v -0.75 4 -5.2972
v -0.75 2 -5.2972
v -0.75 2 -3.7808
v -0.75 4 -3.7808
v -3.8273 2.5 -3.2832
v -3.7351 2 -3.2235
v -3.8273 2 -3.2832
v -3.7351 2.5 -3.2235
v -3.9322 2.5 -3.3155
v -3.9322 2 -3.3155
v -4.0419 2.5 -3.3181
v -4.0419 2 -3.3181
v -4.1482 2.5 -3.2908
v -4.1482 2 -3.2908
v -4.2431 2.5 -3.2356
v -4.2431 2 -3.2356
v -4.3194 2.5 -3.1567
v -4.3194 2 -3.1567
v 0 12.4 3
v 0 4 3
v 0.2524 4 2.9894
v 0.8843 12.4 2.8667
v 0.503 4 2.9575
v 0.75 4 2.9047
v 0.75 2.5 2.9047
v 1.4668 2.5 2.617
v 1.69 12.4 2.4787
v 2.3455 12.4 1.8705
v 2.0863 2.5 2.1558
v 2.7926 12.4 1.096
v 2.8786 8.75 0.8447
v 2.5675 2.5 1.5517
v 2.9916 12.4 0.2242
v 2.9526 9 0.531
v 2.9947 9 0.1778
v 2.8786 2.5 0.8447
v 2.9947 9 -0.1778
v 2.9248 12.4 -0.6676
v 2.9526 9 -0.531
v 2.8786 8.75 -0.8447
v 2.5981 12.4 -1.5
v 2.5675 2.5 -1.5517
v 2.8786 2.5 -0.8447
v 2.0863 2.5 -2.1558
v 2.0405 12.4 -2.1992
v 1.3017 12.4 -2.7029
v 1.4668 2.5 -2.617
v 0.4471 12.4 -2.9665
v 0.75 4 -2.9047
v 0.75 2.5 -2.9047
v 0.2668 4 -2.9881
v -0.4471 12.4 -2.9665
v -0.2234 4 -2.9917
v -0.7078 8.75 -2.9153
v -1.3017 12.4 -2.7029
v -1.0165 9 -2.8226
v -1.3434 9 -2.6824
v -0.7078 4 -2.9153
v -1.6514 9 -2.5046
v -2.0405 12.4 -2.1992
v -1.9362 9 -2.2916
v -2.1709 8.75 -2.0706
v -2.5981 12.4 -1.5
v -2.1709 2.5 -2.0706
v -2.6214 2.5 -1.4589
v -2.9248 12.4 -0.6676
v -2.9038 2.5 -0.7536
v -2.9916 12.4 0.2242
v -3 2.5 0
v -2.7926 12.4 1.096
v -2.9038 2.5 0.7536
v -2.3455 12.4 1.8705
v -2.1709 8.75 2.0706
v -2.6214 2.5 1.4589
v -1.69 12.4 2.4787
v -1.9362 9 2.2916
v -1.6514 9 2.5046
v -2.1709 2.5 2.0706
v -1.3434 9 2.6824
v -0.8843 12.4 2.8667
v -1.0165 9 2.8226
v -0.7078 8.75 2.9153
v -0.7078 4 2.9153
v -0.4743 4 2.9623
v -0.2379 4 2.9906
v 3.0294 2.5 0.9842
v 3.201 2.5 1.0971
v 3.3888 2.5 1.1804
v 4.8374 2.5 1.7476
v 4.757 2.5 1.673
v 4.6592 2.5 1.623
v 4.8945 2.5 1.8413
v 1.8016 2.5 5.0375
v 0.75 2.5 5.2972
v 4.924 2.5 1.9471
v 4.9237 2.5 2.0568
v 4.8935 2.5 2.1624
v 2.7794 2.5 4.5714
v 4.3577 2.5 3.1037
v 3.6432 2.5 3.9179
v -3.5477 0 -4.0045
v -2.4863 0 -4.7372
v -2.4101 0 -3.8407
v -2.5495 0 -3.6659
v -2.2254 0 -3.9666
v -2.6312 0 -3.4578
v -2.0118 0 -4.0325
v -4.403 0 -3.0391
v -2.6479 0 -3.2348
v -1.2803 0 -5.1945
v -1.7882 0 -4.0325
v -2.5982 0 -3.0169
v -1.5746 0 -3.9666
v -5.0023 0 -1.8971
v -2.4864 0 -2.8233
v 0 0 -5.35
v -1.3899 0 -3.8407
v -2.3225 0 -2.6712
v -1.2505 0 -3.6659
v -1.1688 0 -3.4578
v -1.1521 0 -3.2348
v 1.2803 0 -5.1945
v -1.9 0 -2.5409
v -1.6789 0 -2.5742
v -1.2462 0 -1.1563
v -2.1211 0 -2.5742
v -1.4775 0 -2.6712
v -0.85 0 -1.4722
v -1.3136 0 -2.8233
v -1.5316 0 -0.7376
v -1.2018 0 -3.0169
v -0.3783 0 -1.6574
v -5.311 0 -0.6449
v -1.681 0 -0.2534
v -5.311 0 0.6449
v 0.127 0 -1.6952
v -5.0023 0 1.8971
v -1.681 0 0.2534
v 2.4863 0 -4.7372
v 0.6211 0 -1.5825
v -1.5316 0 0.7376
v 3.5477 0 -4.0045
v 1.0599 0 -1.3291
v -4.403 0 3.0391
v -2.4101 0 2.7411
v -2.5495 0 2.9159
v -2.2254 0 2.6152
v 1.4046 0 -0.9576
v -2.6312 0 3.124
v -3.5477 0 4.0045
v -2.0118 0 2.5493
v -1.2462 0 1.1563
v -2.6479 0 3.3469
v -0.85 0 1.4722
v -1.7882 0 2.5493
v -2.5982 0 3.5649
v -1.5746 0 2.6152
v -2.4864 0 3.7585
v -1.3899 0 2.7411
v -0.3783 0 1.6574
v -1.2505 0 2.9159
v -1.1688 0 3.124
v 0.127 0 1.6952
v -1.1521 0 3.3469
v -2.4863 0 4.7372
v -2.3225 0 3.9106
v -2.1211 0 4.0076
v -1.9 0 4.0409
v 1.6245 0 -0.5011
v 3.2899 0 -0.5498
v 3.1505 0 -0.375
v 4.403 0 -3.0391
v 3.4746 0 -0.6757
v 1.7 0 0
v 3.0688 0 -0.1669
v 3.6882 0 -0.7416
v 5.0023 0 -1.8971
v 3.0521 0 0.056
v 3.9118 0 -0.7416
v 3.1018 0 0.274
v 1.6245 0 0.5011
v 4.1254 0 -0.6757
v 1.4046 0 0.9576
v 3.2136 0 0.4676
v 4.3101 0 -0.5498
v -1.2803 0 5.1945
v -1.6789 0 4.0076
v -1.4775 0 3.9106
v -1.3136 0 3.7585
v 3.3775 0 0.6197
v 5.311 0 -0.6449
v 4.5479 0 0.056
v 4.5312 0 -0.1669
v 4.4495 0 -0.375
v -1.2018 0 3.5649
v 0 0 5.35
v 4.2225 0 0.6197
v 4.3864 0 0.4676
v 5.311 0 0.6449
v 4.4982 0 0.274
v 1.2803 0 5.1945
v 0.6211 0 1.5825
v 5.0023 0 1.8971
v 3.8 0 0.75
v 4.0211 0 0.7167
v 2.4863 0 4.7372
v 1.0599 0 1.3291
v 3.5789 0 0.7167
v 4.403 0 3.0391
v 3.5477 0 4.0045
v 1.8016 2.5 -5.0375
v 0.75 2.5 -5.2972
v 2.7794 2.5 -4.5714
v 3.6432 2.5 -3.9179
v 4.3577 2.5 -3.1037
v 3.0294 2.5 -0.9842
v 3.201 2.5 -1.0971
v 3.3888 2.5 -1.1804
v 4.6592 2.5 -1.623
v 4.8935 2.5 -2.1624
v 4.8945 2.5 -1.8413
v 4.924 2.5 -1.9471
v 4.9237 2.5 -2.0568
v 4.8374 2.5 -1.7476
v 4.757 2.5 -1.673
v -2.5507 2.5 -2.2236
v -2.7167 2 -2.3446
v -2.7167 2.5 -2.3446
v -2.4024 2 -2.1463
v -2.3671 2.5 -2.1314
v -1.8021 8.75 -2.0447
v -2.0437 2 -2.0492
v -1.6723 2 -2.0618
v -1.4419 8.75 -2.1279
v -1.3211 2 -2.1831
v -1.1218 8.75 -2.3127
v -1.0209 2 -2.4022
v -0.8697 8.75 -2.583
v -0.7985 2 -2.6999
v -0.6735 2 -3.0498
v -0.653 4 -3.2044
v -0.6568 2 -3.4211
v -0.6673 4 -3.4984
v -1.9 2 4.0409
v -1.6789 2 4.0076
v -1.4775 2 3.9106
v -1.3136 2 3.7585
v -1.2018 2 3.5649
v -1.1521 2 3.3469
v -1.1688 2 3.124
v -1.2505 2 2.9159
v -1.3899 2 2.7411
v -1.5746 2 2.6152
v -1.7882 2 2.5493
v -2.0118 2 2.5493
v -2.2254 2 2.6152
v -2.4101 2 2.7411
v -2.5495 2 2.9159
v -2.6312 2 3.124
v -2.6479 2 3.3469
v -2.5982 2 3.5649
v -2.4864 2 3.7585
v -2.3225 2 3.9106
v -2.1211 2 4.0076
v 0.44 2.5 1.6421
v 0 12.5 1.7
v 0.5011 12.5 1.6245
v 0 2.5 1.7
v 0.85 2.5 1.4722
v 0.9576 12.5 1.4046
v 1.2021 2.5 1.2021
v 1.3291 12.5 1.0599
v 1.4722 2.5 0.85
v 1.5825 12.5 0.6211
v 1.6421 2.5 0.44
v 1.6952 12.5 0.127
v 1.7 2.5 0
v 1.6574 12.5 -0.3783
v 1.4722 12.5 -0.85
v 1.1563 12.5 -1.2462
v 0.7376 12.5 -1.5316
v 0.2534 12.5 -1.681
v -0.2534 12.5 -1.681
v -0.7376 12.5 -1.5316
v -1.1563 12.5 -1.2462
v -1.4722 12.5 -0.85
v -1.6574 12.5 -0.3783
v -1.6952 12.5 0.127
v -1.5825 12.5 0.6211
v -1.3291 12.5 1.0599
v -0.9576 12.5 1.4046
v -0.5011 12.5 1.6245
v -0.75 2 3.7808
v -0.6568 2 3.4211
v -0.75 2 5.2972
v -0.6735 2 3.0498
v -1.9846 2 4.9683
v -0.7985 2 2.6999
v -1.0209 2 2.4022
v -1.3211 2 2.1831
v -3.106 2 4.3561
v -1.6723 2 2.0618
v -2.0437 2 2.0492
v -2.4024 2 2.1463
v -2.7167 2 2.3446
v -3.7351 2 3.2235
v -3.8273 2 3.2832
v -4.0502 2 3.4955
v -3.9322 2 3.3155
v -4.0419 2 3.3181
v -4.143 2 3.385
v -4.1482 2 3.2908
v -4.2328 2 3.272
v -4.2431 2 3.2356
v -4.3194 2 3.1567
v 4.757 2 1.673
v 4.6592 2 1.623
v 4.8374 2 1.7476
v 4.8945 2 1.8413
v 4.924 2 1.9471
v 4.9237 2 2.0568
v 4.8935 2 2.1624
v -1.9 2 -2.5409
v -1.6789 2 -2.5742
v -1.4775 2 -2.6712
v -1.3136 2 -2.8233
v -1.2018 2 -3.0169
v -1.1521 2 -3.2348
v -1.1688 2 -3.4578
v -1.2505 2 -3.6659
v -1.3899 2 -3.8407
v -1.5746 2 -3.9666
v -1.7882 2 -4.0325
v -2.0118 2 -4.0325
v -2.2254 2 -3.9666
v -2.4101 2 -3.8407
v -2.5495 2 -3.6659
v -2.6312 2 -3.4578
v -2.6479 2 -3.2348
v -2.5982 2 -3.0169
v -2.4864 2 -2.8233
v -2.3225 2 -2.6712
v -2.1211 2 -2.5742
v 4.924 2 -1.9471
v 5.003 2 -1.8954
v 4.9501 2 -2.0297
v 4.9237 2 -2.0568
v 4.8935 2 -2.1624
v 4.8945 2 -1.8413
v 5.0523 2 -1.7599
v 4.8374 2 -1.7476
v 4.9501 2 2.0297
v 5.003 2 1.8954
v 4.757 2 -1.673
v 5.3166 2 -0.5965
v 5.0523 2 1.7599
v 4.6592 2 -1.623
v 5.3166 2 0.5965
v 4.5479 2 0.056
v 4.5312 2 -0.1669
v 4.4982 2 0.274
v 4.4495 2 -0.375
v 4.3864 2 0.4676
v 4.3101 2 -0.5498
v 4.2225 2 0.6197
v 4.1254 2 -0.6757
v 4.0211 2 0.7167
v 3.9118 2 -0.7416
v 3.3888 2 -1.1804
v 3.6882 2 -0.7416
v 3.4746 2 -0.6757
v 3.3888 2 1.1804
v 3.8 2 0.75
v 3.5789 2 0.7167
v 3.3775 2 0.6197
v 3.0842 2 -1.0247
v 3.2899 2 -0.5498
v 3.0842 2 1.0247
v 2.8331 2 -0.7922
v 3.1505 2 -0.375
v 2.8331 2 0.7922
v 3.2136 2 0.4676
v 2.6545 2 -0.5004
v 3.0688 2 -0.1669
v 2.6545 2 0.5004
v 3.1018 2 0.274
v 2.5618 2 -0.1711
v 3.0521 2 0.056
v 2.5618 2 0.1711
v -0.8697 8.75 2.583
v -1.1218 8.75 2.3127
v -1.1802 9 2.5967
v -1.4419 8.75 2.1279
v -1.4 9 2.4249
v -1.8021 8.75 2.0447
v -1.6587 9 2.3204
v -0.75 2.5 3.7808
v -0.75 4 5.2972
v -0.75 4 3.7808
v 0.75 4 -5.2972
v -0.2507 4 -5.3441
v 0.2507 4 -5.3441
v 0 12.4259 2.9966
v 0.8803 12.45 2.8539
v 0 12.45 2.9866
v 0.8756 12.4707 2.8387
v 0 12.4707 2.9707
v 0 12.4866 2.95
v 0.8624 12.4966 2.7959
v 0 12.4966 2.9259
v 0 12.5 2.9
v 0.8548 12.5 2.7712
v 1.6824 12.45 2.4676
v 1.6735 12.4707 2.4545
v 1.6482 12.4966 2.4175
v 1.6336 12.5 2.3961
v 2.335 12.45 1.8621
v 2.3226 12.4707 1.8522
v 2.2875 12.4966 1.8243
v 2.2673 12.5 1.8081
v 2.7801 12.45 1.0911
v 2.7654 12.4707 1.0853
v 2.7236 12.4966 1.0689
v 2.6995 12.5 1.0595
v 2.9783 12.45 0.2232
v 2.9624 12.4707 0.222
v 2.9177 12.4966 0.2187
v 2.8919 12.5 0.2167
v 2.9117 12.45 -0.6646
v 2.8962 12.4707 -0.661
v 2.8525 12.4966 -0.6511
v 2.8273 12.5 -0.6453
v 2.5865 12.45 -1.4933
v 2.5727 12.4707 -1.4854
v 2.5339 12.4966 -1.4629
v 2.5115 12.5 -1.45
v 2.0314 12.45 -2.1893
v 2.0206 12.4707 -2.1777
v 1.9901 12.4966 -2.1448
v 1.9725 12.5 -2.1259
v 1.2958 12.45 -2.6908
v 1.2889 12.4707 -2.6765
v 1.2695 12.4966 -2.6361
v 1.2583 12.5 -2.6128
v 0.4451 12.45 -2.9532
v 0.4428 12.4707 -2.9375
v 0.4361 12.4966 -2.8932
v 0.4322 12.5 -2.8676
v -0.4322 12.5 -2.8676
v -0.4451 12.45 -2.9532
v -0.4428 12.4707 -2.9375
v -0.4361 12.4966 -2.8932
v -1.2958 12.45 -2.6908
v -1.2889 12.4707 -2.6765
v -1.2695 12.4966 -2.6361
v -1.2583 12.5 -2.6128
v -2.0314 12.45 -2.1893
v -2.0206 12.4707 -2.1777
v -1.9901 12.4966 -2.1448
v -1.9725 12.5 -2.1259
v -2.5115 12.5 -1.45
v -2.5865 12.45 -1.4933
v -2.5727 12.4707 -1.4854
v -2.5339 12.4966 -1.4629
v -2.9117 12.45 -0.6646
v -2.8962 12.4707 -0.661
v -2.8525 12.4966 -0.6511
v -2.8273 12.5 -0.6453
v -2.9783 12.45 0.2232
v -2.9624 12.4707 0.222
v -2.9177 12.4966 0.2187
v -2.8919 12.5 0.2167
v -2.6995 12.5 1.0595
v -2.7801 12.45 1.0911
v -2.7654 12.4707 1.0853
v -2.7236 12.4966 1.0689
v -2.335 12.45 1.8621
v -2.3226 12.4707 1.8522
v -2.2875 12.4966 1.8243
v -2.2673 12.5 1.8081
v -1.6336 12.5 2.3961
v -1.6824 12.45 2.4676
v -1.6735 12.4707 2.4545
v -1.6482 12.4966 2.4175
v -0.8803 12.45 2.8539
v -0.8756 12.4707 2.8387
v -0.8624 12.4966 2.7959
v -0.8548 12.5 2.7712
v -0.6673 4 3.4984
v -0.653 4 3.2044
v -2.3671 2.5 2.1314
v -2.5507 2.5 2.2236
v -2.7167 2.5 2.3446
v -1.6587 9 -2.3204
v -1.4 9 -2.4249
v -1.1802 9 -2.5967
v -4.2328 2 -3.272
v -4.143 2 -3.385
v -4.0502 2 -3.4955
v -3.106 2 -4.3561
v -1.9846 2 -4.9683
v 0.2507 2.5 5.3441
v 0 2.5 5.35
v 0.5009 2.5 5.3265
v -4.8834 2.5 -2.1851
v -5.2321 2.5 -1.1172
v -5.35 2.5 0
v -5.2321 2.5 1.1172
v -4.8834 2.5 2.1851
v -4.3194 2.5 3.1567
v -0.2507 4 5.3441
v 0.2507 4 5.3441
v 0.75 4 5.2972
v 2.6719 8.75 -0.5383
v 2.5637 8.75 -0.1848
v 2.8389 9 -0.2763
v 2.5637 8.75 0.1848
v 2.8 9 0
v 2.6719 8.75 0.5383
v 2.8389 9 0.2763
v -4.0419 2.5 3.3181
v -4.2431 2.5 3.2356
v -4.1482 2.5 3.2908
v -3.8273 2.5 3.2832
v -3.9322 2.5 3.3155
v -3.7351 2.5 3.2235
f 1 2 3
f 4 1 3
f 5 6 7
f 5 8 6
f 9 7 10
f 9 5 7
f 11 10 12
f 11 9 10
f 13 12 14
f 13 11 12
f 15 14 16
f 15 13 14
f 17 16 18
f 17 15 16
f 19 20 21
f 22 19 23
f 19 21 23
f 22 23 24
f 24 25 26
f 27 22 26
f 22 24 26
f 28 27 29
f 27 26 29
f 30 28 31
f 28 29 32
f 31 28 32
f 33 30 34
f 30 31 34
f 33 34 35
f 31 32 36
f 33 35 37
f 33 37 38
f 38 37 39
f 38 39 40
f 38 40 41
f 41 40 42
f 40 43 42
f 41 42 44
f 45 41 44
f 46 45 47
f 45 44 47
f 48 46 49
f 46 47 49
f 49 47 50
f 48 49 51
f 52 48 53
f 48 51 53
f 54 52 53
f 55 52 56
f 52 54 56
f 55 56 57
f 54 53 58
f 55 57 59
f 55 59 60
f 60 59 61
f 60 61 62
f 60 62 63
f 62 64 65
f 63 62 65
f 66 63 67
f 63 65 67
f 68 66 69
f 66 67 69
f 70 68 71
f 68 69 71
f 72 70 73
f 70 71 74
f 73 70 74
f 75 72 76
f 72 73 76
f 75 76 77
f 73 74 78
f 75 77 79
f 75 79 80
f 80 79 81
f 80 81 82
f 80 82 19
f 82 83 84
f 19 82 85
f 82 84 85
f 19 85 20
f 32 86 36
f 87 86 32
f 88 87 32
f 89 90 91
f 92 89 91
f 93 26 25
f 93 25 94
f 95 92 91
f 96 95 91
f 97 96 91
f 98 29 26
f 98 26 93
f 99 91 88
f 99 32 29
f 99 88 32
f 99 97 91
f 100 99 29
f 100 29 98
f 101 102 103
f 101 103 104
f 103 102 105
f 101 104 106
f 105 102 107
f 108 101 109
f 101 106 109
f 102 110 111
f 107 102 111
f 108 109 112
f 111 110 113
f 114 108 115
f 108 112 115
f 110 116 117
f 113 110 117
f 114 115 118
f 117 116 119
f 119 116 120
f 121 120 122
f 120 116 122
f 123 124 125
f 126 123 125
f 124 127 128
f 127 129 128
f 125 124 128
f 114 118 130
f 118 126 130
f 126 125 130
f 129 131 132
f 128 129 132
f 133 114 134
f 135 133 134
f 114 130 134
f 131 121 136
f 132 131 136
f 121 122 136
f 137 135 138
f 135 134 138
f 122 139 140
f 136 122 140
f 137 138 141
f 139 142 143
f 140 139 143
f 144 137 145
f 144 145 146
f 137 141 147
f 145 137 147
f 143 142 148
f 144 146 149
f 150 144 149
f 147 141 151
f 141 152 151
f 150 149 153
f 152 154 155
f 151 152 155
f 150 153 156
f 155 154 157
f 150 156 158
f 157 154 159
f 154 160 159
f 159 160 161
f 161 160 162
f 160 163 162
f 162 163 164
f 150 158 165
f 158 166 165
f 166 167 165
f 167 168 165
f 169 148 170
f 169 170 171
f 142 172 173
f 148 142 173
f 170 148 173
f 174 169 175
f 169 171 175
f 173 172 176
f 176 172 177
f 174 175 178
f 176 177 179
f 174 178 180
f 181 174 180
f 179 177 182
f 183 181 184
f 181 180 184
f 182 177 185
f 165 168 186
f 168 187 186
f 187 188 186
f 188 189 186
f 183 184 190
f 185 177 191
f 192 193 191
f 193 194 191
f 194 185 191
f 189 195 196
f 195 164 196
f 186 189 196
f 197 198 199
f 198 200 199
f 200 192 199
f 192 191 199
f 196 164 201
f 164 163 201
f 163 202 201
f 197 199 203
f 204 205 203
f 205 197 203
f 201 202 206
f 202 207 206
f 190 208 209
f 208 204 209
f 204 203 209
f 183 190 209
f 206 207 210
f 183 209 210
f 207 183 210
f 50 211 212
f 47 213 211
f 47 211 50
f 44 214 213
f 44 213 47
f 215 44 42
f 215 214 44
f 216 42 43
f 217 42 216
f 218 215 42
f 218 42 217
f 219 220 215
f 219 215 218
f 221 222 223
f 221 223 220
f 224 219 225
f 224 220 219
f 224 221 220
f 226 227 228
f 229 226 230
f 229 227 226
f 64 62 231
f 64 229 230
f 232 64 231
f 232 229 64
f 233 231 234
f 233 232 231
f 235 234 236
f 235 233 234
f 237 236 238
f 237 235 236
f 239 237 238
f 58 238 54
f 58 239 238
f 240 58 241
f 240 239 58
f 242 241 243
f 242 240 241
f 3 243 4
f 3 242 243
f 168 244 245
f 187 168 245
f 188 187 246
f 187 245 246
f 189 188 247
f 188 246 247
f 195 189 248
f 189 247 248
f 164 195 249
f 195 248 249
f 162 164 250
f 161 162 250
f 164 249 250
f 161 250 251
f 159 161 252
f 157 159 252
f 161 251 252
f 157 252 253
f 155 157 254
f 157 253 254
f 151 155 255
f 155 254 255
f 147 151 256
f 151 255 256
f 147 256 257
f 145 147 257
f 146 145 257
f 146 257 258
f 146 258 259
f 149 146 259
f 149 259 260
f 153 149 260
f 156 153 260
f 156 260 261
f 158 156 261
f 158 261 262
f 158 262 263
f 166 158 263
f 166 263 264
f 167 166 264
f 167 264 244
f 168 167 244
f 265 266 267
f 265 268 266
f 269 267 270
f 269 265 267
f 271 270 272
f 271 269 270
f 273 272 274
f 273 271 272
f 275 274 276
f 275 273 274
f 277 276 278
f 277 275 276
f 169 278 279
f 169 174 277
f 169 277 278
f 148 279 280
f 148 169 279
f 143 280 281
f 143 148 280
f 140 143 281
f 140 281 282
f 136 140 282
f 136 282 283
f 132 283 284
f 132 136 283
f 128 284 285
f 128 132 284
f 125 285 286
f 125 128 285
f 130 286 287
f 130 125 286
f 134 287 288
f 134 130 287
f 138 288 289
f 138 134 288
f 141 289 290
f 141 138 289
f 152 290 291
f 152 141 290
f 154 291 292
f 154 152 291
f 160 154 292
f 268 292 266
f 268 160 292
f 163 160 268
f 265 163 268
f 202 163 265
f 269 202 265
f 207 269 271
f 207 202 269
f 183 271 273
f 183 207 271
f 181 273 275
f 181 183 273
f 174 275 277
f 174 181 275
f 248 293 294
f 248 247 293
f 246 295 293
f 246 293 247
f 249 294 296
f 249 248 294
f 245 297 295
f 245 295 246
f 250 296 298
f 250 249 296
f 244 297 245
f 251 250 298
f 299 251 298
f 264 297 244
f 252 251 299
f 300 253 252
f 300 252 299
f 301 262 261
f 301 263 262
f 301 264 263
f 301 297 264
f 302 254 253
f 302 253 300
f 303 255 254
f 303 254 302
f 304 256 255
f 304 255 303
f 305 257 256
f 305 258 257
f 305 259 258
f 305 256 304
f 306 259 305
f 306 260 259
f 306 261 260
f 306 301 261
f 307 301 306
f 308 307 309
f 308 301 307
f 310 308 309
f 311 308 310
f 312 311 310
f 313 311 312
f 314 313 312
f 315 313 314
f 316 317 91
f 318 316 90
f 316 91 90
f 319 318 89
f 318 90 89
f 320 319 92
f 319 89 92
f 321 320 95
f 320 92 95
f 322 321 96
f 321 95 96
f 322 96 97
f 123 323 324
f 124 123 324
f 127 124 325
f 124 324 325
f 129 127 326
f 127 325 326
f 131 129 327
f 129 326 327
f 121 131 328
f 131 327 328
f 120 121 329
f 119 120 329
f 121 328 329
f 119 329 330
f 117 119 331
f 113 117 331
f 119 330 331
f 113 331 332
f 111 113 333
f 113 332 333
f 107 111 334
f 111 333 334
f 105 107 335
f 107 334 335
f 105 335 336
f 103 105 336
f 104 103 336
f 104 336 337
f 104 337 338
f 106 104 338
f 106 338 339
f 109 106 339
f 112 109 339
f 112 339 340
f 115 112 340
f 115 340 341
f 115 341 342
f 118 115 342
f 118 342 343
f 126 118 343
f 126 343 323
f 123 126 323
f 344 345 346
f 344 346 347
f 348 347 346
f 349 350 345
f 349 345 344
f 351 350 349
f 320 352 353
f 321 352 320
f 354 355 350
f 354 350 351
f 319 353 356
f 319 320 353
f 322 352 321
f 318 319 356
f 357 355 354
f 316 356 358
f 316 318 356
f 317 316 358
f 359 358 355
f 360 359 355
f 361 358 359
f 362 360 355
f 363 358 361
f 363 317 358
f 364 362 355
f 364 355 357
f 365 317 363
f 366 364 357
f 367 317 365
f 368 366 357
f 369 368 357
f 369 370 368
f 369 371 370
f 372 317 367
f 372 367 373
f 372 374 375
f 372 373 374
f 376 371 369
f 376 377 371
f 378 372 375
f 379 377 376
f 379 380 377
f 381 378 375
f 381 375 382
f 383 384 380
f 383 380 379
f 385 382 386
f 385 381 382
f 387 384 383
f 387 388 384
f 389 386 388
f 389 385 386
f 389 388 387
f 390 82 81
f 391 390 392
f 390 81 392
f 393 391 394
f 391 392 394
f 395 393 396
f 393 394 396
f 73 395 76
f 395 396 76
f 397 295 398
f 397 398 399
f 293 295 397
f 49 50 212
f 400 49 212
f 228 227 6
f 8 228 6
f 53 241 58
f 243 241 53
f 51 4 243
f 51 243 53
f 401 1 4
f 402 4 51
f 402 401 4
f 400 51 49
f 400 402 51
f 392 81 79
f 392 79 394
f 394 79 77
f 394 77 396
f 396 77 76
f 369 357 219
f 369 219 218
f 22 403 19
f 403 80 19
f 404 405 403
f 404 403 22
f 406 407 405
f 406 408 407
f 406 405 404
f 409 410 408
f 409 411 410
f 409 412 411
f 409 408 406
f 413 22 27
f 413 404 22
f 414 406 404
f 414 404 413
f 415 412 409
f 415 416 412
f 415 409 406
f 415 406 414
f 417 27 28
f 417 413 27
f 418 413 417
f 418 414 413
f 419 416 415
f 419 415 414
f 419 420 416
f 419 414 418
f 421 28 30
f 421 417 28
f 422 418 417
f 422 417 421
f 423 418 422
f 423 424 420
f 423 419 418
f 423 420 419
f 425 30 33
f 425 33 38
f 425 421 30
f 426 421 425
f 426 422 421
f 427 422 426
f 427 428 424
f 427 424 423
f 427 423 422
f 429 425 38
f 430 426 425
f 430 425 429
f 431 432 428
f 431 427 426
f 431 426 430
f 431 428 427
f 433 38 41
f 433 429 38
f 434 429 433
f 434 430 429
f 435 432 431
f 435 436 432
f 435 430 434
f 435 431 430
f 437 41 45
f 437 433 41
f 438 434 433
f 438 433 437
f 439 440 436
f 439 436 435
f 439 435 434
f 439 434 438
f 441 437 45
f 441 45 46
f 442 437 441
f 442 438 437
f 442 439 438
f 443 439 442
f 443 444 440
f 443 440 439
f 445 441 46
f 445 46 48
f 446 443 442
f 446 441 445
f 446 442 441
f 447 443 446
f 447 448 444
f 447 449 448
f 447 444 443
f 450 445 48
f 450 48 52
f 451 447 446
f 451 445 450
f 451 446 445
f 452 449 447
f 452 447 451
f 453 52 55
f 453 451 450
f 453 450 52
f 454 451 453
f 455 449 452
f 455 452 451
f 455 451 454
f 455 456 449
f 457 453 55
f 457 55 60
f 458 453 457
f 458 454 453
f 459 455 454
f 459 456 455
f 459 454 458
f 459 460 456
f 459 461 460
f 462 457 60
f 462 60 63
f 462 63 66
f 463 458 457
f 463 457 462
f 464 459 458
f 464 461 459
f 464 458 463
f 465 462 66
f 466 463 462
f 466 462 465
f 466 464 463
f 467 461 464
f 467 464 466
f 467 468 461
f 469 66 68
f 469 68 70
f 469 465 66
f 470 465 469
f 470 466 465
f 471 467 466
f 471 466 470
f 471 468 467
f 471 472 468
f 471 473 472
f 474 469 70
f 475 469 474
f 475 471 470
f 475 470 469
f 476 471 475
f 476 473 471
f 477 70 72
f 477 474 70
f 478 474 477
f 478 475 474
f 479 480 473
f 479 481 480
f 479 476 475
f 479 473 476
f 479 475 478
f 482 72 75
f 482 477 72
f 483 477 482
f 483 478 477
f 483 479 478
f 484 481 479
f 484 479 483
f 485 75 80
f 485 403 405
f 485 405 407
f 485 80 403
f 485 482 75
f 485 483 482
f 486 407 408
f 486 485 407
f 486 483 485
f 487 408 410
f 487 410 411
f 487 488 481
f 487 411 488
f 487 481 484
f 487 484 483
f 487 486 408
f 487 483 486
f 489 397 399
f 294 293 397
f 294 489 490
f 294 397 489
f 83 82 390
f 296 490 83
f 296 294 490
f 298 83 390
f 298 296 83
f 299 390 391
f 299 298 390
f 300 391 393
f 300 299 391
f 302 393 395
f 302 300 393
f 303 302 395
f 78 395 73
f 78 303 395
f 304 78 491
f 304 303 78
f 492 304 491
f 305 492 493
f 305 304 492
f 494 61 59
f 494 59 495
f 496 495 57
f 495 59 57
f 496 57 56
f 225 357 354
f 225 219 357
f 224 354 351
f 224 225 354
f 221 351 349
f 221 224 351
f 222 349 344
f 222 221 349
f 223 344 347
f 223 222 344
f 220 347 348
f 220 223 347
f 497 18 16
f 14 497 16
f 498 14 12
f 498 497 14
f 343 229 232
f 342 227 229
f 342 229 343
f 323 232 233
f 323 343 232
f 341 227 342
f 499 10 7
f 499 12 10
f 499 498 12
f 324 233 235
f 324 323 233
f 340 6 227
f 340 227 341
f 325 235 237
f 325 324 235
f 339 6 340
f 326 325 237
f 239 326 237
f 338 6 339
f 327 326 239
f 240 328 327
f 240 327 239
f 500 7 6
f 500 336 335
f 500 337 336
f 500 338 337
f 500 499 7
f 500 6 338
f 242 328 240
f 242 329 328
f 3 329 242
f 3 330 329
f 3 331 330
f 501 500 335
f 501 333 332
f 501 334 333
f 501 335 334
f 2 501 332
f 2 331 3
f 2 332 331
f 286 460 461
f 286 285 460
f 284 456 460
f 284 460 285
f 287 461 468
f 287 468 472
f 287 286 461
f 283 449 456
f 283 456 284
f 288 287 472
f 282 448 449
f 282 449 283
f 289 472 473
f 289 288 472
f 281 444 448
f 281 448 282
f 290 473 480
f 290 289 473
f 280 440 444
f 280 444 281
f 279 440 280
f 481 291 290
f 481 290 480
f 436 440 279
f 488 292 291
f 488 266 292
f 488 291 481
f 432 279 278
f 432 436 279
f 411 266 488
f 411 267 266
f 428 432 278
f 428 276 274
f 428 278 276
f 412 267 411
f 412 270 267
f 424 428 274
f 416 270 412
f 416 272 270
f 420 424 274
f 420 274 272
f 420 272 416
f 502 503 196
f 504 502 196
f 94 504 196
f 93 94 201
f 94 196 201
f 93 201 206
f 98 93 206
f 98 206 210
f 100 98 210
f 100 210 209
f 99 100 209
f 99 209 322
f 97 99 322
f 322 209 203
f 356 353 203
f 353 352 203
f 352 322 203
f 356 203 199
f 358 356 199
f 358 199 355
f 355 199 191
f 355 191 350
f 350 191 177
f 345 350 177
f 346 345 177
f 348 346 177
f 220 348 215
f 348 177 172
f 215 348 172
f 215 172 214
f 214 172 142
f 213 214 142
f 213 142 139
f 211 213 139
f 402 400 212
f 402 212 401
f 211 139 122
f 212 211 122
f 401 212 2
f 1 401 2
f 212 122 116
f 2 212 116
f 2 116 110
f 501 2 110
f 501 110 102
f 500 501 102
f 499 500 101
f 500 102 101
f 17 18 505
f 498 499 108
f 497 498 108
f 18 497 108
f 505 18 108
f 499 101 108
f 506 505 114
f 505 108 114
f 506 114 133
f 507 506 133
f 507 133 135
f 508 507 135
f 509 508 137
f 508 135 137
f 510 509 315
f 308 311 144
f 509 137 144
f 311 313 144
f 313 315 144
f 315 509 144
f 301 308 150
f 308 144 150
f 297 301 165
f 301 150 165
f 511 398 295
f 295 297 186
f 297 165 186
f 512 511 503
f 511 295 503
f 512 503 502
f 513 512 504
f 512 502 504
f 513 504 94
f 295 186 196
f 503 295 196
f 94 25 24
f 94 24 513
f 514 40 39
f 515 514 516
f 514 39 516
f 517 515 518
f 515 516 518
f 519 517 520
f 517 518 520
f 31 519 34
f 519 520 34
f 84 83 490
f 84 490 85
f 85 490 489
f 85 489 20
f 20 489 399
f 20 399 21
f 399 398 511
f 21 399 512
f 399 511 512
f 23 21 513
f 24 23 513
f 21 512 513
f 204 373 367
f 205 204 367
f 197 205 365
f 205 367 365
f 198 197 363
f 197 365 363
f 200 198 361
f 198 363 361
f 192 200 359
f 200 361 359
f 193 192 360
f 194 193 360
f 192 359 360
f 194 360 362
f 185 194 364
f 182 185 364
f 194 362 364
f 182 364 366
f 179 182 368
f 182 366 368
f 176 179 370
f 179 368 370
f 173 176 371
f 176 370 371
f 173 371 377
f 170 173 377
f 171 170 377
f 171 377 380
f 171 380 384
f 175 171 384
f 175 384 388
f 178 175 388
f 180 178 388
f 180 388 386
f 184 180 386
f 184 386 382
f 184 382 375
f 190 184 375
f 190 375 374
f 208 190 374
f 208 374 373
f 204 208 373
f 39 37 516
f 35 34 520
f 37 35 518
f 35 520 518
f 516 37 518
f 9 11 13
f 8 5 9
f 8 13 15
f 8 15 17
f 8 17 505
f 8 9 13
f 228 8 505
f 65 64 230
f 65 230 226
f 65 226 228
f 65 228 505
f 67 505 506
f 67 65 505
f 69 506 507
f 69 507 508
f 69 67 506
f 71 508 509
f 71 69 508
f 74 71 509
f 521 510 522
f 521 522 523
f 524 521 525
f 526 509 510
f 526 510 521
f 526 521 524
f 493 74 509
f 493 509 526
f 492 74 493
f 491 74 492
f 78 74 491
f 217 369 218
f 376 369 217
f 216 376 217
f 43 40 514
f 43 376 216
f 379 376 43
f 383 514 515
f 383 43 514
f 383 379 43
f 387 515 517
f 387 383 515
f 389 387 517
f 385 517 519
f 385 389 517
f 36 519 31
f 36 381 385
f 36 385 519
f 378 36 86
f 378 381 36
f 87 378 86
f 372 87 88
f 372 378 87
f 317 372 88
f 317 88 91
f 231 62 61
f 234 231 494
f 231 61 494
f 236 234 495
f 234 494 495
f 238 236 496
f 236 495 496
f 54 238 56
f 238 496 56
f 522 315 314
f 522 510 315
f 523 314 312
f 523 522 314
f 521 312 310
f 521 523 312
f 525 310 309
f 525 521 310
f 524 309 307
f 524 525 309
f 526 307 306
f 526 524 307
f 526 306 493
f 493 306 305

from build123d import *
from build123d.topology import SkipClean

# Parameters (mm, degrees)
SKETCH1_R           = 5.35
BOSS_EXTRUDE1_DEPTH = 2.5
HOLE1_OUTLINE_R     = 1.7
HOLE1_DEPTH         = 2.5
SKETCH3_R           = 3
SKETCH3_R_2         = 1.7
BOSS_EXTRUDE2_DEPTH = 10
FILLET1_R           = 0.1
BOSS_EXTRUDE3_DEPTH = 1.5
SKETCH8_R           = 0.75
CUT_EXTRUDE1_DEPTH  = 13.539736839
CUT_EXTRUDE3_START  = -0.5
SKETCH13_R          = 1.25
CUT_EXTRUDE3_DEPTH  = 7
CHAMFER1_SIZE       = 0.25
CUT_EXTRUDE4_START  = -0.5
CUT_EXTRUDE4_DEPTH  = 0.5
FILLET2_R           = 0.4


# Read off the part's stored shape, not the designer's step: Hole1
with BuildPart() as part:
    # Sketch1 → Boss-Extrude1 (new body)
    with BuildSketch(Plane(origin=(0, 0, 0), x_dir=(1, 0, 0), z_dir=(0, 1, 0))):
        with Locations(Location((0, 0, 0), (0, 0, 270))):
            Circle(SKETCH1_R)
    extrude(amount=BOSS_EXTRUDE1_DEPTH)

    # Hole1 outline → Hole1 (cut)
    with BuildSketch(Plane(origin=(0, 0, 0), x_dir=(1, 0, 0), z_dir=(0, 1, 0))):
        Circle(HOLE1_OUTLINE_R)
    extrude(amount=HOLE1_DEPTH, mode=Mode.SUBTRACT)

    # Sketch3 → Boss-Extrude2 (add)
    with BuildSketch(Plane(origin=(0, 2.5, 0), x_dir=(1, 0, 0), z_dir=(0, 1, 0))):
        with Locations(Location((0, 0, 0), (0, 0, 270))):
            Circle(SKETCH3_R)
        with Locations(Location((0, 0, 0), (0, 0, 270))):
            Circle(SKETCH3_R_2, mode=Mode.SUBTRACT)
    extrude(amount=BOSS_EXTRUDE2_DEPTH)

    # Fillet1
    fillet1_edges = [part.edges().sort_by_distance(p)[0] for p in [
        (0, 12.5, -3),
    ]]
    fillet(fillet1_edges, radius=FILLET1_R)

    # Sketch5 → Boss-Extrude3 (add)
    with BuildSketch(Plane(origin=(0, 2.5, 0), x_dir=(1, 0, 0), z_dir=(0, 1, 0))):
        with BuildLine():
            Line((-0.75, 5.297169055), (-0.75, 2.90473751))
            ThreePointArc((-0.75, 2.90473751), (0, 3), (0.75, 2.90473751))
            Line((0.75, 2.90473751), (0.75, 5.297169055))
            ThreePointArc((0.75, 5.297169055), (0, 5.35), (-0.75, 5.297169055))
        make_face()
    boss_extrude3 = extrude(amount=BOSS_EXTRUDE3_DEPTH)

    # Mirror1: Boss-Extrude3 across plane
    with SkipClean():  # the faces are left unmerged after this step: merging them gives an invalid solid
        add(boss_extrude3.mirror(Plane.XY))

    # Sketch8 → Cut-Extrude1 (cut, through all)
    with SkipClean():  # the faces are left unmerged after this step: merging them gives an invalid solid
        with BuildSketch(Plane(origin=(0, 2.5, 0), x_dir=(1, 0, 0), z_dir=(0, 1, 0))):
            with Locations(Location((3.8, 0, 0), (0, 0, 270))):
                Circle(SKETCH8_R)
            with Locations(Location((-1.9, -3.290896534, 0), (0, 0, 270))):
                Circle(SKETCH8_R)
            with Locations(Location((-1.9, 3.290896534, 0), (0, 0, 270))):
                Circle(SKETCH8_R)
        extrude(amount=-CUT_EXTRUDE1_DEPTH, mode=Mode.SUBTRACT)

    # Sketch13 → Cut-Extrude3 (cut)
    with SkipClean():  # the faces are left unmerged after this step: merging them gives an invalid solid
        with BuildSketch(Plane(origin=(0, 2.5, 0), x_dir=(1, 0, 0), z_dir=(0, 1, 0)).offset(CUT_EXTRUDE3_START)):
            with Locations(Location((-1.9, 3.290896534, 0), (0, 0, 23.073918066))):
                Circle(SKETCH13_R)
            with Locations(Location((-1.9, -3.290896534, 0), (0, 0, 102.514591278))):
                Circle(SKETCH13_R)
            with Locations(Location((3.8, 0, 0), (0, 0, 137.485408722))):
                Circle(SKETCH13_R)
        extrude(amount=CUT_EXTRUDE3_DEPTH, mode=Mode.SUBTRACT)

    # Chamfer1
    chamfer1_edges = [part.edges().sort_by_distance(p)[0] for p in [
        (-1.275, 9, -2.20836478),
        (-1.275, 9, 2.20836478),
        (2.55, 9, 0),
    ]]
    chamfer(chamfer1_edges, length=CHAMFER1_SIZE)

    # Sketch14 → Cut-Extrude4 (cut)
    with BuildSketch(Plane(origin=(0, 2.5, 0), x_dir=(1, 0, 0), z_dir=(0, 1, 0)).offset(CUT_EXTRUDE4_START)):
        with BuildLine():
            Line((-0.75, -3.780794483), (-0.75, -5.297169055))
            ThreePointArc((-0.75, -5.297169055), (-2.563606422, -4.695787699), (-4.050222345, -3.495454041))
            Line((-4.050222345, -3.495454041), (-2.716694869, -2.344582902))
            ThreePointArc((-2.716694869, -2.344582902), (-2.637189937, -4.300377092), (-0.75, -3.780794483))
        make_face()
        with BuildLine():
            Line((-0.75, 5.297169055), (-0.75, 3.780794483))
            ThreePointArc((-0.75, 3.780794483), (-2.637189937, 4.300377092), (-2.716694869, 2.344582902))
            Line((-2.716694869, 2.344582902), (-4.050222345, 3.495454041))
            ThreePointArc((-4.050222345, 3.495454041), (-2.563606422, 4.695787699), (-0.75, 5.297169055))
        make_face()
        with BuildLine():
            Line((3.388815789, -1.18043532), (5.05226317, -1.759868421))
            ThreePointArc((5.05226317, -1.759868421), (5.35, 0), (5.05226317, 1.759868421))
            Line((5.05226317, 1.759868421), (3.388815789, 1.18043532))
            ThreePointArc((3.388815789, 1.18043532), (5.05, 0), (3.388815789, -1.18043532))
        make_face()
    extrude(amount=CUT_EXTRUDE4_DEPTH, mode=Mode.SUBTRACT)

    # Fillet2
    fillet2_edges = [part.edges().sort_by_distance(p)[0] for p in [
        (-4.050222345, 2.25, -3.495454041),
        (-4.050222345, 2.25, 3.495454041),
        (5.05226317, 2.25, -1.759868421),
        (5.05226317, 2.25, 1.759868421),
    ]]
    fillet(fillet2_edges, radius=FILLET2_R)


solid = part.part
